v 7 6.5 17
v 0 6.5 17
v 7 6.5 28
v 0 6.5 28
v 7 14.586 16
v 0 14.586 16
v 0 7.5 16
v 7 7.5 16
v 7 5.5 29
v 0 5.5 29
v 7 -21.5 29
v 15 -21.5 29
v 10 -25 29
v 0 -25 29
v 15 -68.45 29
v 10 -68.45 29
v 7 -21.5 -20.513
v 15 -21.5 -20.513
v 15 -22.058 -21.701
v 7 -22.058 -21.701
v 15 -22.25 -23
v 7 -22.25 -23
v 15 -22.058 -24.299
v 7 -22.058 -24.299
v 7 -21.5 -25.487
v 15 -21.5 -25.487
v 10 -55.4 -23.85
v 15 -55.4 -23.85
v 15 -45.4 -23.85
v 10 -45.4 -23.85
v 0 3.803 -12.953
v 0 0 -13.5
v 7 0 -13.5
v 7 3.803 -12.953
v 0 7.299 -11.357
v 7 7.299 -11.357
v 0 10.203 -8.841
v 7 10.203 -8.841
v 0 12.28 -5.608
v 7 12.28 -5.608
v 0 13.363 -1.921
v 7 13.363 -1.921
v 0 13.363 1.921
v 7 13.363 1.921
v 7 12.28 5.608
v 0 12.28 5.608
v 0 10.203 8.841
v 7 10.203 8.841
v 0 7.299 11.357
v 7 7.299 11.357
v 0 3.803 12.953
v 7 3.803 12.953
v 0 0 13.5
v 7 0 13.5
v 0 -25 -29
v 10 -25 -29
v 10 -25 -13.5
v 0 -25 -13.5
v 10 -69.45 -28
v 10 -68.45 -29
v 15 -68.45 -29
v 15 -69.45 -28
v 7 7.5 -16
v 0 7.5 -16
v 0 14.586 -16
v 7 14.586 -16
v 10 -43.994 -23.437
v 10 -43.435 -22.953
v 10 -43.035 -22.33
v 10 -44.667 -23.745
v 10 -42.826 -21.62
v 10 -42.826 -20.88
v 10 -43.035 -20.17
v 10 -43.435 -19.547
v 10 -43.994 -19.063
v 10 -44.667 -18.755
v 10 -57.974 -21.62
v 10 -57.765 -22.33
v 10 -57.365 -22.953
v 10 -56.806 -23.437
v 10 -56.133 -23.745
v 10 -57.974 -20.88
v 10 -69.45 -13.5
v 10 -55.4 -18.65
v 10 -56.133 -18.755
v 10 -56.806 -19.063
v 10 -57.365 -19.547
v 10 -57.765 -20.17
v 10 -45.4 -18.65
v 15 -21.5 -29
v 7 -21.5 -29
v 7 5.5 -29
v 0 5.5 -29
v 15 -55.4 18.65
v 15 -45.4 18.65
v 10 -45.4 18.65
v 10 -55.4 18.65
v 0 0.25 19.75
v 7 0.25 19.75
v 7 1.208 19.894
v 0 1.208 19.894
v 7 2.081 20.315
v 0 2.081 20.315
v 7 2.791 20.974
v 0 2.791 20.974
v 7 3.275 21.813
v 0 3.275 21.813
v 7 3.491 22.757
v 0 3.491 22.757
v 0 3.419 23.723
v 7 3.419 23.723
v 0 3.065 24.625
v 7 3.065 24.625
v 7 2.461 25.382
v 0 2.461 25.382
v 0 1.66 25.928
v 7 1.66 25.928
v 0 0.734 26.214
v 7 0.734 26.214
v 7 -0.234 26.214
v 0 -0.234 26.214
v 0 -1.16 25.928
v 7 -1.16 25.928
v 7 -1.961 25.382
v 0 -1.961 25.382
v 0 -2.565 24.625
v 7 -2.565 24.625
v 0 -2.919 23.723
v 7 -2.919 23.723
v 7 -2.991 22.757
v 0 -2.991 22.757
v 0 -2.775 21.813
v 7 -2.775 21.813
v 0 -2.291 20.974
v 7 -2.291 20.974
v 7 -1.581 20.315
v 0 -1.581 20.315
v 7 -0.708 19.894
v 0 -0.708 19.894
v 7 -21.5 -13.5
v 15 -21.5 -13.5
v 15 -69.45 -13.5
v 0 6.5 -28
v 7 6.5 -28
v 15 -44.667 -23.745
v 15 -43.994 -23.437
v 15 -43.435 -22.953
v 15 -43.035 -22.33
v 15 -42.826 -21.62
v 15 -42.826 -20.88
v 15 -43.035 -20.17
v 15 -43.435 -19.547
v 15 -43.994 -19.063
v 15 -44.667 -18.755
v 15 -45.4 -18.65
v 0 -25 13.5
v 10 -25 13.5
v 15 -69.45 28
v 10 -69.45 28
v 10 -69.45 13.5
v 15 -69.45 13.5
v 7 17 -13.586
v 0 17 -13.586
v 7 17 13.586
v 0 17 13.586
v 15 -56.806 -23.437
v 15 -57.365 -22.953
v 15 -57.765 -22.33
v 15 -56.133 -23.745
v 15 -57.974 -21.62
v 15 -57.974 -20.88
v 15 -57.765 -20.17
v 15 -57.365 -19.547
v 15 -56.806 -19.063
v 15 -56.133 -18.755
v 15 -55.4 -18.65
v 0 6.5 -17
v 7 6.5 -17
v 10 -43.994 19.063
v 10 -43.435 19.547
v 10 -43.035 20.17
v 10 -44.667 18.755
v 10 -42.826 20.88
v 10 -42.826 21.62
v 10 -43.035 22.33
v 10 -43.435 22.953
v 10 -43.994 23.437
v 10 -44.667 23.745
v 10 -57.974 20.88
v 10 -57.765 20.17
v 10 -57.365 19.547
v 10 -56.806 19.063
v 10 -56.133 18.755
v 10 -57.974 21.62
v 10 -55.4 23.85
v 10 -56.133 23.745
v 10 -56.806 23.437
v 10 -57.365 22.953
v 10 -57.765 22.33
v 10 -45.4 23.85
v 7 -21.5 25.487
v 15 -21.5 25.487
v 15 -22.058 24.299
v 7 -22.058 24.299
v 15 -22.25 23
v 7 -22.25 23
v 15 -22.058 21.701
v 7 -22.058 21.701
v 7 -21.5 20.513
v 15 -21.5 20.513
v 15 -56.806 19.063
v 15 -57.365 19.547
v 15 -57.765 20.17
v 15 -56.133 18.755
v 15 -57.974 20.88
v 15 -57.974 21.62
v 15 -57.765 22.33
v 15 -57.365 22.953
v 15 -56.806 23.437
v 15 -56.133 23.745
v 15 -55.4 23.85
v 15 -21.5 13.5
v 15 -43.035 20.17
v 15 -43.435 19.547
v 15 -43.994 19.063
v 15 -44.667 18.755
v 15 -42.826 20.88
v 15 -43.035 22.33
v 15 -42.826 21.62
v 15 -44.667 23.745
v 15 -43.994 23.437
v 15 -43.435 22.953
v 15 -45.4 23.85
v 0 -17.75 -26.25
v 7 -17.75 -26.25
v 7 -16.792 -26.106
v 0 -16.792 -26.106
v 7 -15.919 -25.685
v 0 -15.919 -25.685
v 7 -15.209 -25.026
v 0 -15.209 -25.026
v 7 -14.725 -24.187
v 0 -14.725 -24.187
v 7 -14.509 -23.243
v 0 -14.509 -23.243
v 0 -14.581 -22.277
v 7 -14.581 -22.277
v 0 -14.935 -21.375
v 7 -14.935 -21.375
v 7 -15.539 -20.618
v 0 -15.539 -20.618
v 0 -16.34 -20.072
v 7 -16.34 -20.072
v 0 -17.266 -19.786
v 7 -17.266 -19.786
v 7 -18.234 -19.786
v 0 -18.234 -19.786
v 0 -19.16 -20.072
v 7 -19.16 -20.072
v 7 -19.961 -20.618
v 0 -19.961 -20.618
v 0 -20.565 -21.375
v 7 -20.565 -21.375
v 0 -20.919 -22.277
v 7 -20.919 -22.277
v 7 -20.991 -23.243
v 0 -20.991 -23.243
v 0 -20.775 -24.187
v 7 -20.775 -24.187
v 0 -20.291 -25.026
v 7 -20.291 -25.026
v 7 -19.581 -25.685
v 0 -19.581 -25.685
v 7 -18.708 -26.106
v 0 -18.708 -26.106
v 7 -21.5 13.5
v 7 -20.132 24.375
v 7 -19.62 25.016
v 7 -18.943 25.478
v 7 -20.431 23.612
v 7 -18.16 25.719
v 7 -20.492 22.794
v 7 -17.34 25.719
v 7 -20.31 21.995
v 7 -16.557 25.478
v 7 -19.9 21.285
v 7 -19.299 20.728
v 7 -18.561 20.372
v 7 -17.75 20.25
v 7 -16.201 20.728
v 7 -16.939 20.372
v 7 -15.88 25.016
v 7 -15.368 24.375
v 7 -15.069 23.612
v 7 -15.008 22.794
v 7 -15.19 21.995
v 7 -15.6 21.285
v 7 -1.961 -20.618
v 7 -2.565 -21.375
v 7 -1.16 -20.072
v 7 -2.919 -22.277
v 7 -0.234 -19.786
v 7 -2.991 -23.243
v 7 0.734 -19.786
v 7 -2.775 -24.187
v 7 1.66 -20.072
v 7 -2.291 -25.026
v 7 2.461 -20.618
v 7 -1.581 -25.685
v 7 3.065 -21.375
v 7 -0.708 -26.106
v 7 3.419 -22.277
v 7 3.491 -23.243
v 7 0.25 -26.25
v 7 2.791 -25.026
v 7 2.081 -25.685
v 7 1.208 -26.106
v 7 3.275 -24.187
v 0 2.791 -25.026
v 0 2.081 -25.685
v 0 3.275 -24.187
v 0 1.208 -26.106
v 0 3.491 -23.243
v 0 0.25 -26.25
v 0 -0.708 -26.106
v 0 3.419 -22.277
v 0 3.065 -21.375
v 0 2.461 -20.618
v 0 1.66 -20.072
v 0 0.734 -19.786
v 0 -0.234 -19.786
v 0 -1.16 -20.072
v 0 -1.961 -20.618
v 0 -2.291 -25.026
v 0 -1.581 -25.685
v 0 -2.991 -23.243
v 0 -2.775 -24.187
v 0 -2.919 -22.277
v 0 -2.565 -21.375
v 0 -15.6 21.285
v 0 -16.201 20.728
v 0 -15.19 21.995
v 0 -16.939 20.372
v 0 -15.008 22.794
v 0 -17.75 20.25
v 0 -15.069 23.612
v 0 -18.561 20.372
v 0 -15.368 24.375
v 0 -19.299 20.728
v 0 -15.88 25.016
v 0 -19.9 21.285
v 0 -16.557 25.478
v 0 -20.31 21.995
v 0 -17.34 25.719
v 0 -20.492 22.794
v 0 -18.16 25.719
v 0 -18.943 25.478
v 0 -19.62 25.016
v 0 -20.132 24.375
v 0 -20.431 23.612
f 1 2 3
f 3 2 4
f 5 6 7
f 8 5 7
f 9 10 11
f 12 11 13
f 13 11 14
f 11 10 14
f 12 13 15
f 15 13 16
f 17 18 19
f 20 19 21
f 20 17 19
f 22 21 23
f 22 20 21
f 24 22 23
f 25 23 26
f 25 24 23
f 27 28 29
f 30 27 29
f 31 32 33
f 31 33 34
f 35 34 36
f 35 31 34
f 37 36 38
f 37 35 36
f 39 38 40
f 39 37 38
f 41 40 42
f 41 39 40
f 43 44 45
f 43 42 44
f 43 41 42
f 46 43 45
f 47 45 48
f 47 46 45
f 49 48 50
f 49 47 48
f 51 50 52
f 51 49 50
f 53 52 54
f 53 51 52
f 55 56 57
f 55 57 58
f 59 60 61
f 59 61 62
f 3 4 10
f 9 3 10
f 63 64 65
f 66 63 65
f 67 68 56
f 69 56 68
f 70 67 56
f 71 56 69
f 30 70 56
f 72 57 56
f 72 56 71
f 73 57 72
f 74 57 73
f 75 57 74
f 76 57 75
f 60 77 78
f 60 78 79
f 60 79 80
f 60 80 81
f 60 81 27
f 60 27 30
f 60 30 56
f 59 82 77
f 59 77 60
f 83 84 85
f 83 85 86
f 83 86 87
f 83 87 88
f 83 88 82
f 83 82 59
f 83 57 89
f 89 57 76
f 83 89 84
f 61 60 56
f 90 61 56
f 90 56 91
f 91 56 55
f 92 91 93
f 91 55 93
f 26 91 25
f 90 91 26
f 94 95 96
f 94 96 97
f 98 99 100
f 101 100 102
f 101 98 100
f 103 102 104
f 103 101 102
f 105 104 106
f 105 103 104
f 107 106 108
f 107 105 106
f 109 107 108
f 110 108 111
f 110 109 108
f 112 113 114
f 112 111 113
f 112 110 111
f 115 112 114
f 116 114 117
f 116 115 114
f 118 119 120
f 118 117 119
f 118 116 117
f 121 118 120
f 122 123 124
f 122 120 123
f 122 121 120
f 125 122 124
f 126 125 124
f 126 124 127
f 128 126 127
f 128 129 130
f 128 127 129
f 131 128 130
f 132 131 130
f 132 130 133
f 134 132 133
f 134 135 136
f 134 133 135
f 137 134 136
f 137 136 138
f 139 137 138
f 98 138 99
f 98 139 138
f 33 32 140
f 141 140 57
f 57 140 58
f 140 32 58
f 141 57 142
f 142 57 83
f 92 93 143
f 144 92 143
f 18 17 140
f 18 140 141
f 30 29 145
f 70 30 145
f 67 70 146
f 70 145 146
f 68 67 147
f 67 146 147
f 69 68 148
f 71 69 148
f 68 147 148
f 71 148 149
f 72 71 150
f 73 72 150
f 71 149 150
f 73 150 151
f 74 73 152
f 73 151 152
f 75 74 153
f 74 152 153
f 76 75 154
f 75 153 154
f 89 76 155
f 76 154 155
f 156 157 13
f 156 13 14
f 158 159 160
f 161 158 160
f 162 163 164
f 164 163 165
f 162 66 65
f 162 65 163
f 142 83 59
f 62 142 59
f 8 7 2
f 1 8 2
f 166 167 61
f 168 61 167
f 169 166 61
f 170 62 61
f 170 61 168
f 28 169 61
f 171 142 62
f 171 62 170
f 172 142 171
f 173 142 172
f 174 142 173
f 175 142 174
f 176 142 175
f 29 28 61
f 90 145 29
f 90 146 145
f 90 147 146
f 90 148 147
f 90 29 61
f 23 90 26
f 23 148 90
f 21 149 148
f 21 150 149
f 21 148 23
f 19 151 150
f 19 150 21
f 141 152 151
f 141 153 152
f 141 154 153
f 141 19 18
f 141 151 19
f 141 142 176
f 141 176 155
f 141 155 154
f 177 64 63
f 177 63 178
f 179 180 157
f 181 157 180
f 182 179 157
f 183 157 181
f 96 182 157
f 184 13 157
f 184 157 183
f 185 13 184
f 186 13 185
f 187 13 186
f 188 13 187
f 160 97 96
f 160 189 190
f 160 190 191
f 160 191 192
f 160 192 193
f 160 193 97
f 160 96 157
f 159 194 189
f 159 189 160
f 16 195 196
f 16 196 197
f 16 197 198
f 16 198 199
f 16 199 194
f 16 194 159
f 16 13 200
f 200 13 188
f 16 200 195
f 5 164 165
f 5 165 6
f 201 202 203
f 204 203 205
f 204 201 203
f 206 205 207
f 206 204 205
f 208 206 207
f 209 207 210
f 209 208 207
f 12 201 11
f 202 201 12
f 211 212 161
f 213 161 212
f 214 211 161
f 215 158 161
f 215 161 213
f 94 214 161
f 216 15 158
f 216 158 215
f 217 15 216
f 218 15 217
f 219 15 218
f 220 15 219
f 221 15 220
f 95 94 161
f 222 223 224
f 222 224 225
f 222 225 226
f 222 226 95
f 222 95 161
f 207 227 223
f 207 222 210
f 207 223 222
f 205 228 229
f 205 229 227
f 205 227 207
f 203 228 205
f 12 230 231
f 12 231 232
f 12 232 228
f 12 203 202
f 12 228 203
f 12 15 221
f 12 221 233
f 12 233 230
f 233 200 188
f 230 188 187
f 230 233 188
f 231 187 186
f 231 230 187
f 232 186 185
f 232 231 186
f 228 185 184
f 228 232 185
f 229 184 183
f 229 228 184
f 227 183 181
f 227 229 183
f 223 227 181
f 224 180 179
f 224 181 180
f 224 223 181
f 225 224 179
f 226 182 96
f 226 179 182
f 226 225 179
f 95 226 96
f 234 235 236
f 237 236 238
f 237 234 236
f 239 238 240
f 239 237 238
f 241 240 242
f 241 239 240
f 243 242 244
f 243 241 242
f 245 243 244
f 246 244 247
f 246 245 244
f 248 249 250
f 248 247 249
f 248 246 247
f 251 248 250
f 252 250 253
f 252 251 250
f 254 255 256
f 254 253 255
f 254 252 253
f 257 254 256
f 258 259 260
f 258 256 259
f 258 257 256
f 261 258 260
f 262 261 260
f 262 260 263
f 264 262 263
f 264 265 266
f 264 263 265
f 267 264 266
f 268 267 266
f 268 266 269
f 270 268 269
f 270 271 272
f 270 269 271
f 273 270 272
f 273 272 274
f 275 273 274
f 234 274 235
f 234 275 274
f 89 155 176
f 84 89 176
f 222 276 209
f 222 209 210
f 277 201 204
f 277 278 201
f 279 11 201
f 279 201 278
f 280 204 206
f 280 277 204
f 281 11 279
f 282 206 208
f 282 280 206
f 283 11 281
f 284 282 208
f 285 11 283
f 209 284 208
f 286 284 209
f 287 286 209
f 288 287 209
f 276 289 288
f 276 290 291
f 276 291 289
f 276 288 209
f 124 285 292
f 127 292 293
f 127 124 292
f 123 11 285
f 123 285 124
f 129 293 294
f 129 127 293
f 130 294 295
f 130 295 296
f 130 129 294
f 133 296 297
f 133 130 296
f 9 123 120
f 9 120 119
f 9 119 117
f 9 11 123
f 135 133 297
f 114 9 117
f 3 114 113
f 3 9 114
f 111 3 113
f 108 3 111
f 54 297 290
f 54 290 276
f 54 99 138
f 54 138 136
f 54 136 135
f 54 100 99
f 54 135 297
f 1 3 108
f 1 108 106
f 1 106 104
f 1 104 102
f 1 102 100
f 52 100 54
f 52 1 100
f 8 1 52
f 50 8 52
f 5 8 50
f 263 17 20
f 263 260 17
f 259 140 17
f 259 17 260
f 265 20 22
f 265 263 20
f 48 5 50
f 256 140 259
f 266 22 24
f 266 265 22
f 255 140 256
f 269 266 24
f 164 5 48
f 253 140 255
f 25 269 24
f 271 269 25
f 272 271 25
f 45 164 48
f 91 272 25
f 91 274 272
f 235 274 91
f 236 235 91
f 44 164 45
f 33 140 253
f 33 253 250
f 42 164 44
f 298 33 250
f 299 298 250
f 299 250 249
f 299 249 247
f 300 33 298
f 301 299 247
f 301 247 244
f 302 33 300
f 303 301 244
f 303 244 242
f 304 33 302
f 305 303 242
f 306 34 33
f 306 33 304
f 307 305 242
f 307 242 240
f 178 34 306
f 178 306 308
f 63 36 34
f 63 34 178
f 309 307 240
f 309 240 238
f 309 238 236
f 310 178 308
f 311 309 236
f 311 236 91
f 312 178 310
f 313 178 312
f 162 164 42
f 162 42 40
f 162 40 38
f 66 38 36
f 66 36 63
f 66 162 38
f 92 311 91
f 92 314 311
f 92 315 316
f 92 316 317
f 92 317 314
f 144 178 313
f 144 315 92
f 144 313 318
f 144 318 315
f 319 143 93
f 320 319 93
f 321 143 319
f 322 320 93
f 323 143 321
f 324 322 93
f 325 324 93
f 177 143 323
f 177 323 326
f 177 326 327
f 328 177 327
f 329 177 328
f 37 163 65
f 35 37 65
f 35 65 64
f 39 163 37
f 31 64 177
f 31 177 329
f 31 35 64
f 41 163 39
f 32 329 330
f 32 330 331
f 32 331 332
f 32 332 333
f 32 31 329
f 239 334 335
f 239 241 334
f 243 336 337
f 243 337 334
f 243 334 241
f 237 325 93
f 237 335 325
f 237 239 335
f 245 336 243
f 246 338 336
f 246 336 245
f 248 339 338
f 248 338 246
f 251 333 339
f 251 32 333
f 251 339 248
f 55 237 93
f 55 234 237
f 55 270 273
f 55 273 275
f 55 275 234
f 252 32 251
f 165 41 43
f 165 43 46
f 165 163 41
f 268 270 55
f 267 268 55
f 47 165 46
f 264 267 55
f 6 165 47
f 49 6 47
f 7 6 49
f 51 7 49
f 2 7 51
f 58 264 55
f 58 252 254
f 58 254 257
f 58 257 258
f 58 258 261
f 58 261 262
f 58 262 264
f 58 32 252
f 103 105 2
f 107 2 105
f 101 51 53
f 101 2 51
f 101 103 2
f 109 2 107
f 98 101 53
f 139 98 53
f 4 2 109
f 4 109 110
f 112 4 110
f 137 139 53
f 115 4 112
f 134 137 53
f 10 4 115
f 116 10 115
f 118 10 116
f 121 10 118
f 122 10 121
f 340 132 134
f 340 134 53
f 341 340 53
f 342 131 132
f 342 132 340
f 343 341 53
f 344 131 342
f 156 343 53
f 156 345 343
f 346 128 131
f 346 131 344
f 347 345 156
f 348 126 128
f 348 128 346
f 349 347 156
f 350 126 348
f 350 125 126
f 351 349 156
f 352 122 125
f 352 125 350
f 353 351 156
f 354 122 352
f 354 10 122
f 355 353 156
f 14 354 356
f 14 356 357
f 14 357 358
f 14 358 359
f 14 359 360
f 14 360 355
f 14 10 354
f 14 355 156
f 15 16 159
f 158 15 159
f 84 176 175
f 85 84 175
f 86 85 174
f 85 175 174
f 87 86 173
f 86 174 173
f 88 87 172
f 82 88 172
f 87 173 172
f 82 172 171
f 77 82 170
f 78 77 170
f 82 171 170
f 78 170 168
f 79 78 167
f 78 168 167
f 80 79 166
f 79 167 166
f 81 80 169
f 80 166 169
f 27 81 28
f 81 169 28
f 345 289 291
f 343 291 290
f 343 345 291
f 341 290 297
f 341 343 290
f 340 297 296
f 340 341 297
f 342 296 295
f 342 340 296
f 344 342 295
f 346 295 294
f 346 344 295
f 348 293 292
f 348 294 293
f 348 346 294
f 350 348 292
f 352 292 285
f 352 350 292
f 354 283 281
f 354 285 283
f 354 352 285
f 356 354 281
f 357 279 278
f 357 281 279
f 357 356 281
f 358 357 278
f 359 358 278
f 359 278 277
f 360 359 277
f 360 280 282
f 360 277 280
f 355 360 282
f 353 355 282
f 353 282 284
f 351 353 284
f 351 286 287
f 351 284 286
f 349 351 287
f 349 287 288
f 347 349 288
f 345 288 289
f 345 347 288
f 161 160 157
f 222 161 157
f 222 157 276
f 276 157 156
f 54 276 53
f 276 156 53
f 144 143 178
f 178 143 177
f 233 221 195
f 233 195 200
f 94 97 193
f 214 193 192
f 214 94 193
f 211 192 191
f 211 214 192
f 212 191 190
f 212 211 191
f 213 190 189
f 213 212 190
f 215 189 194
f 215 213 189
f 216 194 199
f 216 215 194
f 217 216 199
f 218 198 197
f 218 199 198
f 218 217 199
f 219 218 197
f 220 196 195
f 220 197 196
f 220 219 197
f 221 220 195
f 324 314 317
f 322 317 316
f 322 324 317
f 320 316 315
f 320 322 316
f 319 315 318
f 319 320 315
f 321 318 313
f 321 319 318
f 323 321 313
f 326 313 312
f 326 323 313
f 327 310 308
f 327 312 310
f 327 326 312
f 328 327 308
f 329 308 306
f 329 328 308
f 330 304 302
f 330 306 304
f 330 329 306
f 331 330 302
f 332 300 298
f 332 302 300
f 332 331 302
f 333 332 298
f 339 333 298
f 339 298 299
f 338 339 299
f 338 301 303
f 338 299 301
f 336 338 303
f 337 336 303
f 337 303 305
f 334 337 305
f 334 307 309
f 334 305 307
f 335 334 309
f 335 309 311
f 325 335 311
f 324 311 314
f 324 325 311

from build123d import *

# Parameters (mm, degrees)
SKETCH1_W                               = 43
SKETCH1_H                               = 60
BOSS_EXTRUDE1_DEPTH                     = 20
SKETCH2_W                               = 13
SKETCH2_H                               = 10.5
CUT_EXTRUDE1_DEPTH                      = 44.874821937
SKETCH3_W                               = 13
SKETCH3_H                               = 10.5
CUT_EXTRUDE2_DEPTH                      = 44.874821937
F_5_5_5_5_DIAMETER_HOLE1_D              = 5.5
M22_CLEARANCE_HOLE1_D                   = 26
F_5_5_5_5_DIAMETER_HOLE2_D              = 5.5
F_5_5_5_5_DIAMETER_HOLE2_DEPTH          = 30
CBORE_FOR_M5_HEX_HEAD_BOLT1_D           = 5.5
CBORE_FOR_M5_HEX_HEAD_BOLT1_DEPTH       = 39.75
CBORE_FOR_M5_HEX_HEAD_BOLT1_CBORE_D     = 10.8
CBORE_FOR_M5_HEX_HEAD_BOLT1_CBORE_DEPTH = 3
CHAMFER1_SIZE                           = 3
CHAMFER2_SIZE                           = 0.5
CHAMFER3_SIZE                           = 1
BOSS_EXTRUDE2_OUTLINE_R                 = 2.75
BOSS_EXTRUDE2_OUTLINE_R_2               = 3.25
BOSS_EXTRUDE2_OUTLINE_R_3               = 13.5
BOSS_EXTRUDE2_DEPTH                     = 15
CUT_EXTRUDE4_DEPTH                      = 15
CHAMFER4_SIZE                           = 1
CUT_EXTRUDE5_DEPTH                      = 94.296851501
CUT_EXTRUDE5_DEPTH_BACK                 = 94.296851501
SKETCH17_W                              = 10
SKETCH17_H                              = 43.45
SKETCH17_H_2                            = 1
CUT_EXTRUDE6_DEPTH                      = 77.741791092
SKETCH20_R                              = 13.5
SKETCH20_W                              = 27
SKETCH20_H                              = 44.45
CUT_EXTRUDE7_DEPTH                      = 77.741791092
SKETCH22_W                              = 8
SKETCH22_H                              = 58
CUT_EXTRUDE8_DEPTH                      = 38.5
SKETCH23_R                              = 4.5
CUT_EXTRUDE9_DEPTH                      = 76.68555014


# Read off the part's stored shape, not the designer's step: Boss-Extrude2
with BuildPart() as part:
    # Sketch1 → Boss-Extrude1 (new body)
    with BuildSketch(Plane(origin=(-20, 0, 0), x_dir=(0, -1, 0), z_dir=(-1, 0, 0))):
        with Locations((3.5, 0)):
            Rectangle(SKETCH1_W, SKETCH1_H)
    extrude(amount=-BOSS_EXTRUDE1_DEPTH)

    # Sketch2 → Cut-Extrude1 (cut, through all)
    with BuildSketch(Plane(origin=(0, 0, 0), x_dir=(0, 0, -1), z_dir=(1, 0, 0))):
        with Locations((-23.5, 12.75)):
            Rectangle(SKETCH2_W, SKETCH2_H)
    extrude(amount=-CUT_EXTRUDE1_DEPTH, mode=Mode.SUBTRACT)

    # Sketch3 → Cut-Extrude2 (cut, through all)
    with BuildSketch(Plane(origin=(0, 0, 0), x_dir=(0, 0, -1), z_dir=(1, 0, 0))):
        with Locations((23.5, 12.75)):
            Rectangle(SKETCH3_W, SKETCH3_H)
    extrude(amount=-CUT_EXTRUDE2_DEPTH, mode=Mode.SUBTRACT)

    # Ø5.5 (5.5) Diameter Hole1 (through all)
    with Locations(Plane.ZY.offset(20)):
        with Locations((23, 0.25), (-23, -17.75), (-23, 0.25)):
            Hole(F_5_5_5_5_DIAMETER_HOLE1_D / 2)

    # M22 Clearance Hole1 (through all)
    with Locations(Plane(origin=(0, 0, 0), x_dir=(0, 0, -1), z_dir=(1, 0, 0))):
        with Locations((0, 0)):
            Hole(M22_CLEARANCE_HOLE1_D / 2)

    # Ø5.5 (5.5) Diameter Hole2
    with Locations(Plane(origin=(0, 0, 0), x_dir=(0, 0, -1), z_dir=(1, 0, 0))):
        with Locations((-23, -17.75)):
            Hole(F_5_5_5_5_DIAMETER_HOLE2_D / 2, depth=F_5_5_5_5_DIAMETER_HOLE2_DEPTH)

    # CBORE for M5 Hex Head Bolt1
    with Locations(Plane(origin=(0, 7.5, 0), x_dir=(1, 0, 0), z_dir=(0, 1, 0))):
        with Locations((-10, 23), (-10, -23)):
            CounterBoreHole(CBORE_FOR_M5_HEX_HEAD_BOLT1_D / 2, CBORE_FOR_M5_HEX_HEAD_BOLT1_CBORE_D / 2, CBORE_FOR_M5_HEX_HEAD_BOLT1_CBORE_DEPTH, depth=CBORE_FOR_M5_HEX_HEAD_BOLT1_DEPTH)

    # Chamfer1
    chamfer1_edges = [part.edges().sort_by_distance(p)[0] for p in [
        (-10, 18, 17),
        (-10, 18, -17),
    ]]
    chamfer(chamfer1_edges, length=CHAMFER1_SIZE)

    # Chamfer2
    chamfer2_edges = [part.edges().sort_by_distance(p)[0] for p in [
        (-7.25, -25, -23),
        (-20, 0.25, -20.25),
        (0, 0.25, -20.25),
        (-20, -17.75, -20.25),
        (0, -17.75, -20.25),
        (-20, 0.25, 25.75),
        (0, 0.25, 25.75),
        (0, 0, -13),
        (-20, 0, -13),
        (-20, -17.75, 20.25),
        (0, -17.75, 20.25),
        (-7.25, -25, 23),
    ]]
    chamfer(chamfer2_edges, length=CHAMFER2_SIZE)

    # Chamfer3
    chamfer3_edges = [part.edges().sort_by_distance(p)[0] for p in [
        (0, 11.25, -17),
        (-20, 11.25, -17),
        (0, 18, 0),
        (0, 16.5, 15.5),
        (0, 16.5, -15.5),
        (-20, 18, 0),
        (-20, 16.5, 15.5),
        (-20, 16.5, -15.5),
        (-10, 7.5, 30),
        (-20, 11.25, 17),
        (-20, 7.5, 23.5),
        (0, 7.5, 23.5),
        (0, 11.25, 17),
        (-20, -8.75, -30),
        (0, -8.75, -30),
        (-20, 7.5, -23.5),
        (-10, 7.5, -30),
        (0, 7.5, -23.5),
        (0, -25, 0),
        (-20, -8.75, 30),
        (-20, -25, 0),
        (-10, -25, -30),
        (-10, -25, 30),
        (0, -8.75, 30),
    ]]
    chamfer(chamfer3_edges, length=CHAMFER3_SIZE)

    # Boss-Extrude2 outline → Boss-Extrude2 (add)
    with BuildSketch(Plane(origin=(0, 0, 0), x_dir=(0, 0, -1), z_dir=(1, 0, 0))):
        Polygon((-29, 6.5), (-29, -69.45), (29, -69.45), (29, 6.5), (16, 6.5), (16, 14.585786438), (13.585786438, 17), (-13.585786438, 17), (-16, 14.585786438), (-16, 6.5), align=None)
        with Locations((-23, -17.75)):
            Circle(BOSS_EXTRUDE2_OUTLINE_R, mode=Mode.SUBTRACT)
        with Locations((-23, 0.25)):
            Circle(BOSS_EXTRUDE2_OUTLINE_R_2, mode=Mode.SUBTRACT)
        with Locations((23, -17.75)):
            Circle(BOSS_EXTRUDE2_OUTLINE_R_2, mode=Mode.SUBTRACT)
        Circle(BOSS_EXTRUDE2_OUTLINE_R_3, mode=Mode.SUBTRACT)
        with Locations((23, 0.25)):
            Circle(BOSS_EXTRUDE2_OUTLINE_R_2, mode=Mode.SUBTRACT)
    extrude(amount=BOSS_EXTRUDE2_DEPTH)

    # Sketch16 → Cut-Extrude4 (cut)
    with BuildSketch(Plane(origin=(15, 0, 0), x_dir=(0, 0, -1), z_dir=(1, 0, 0))):
        with BuildLine():
            Line((-23.85, -55.4), (-23.85, -45.4))
            ThreePointArc((-23.85, -45.4), (-21.25, -42.8), (-18.65, -45.4))
            Line((-18.65, -45.4), (-18.65, -55.4))
            ThreePointArc((-18.65, -55.4), (-21.25, -58), (-23.85, -55.4))
        make_face()
        with BuildLine():
            Line((23.85, -55.4), (23.85, -45.4))
            ThreePointArc((23.85, -45.4), (21.25, -42.8), (18.65, -45.4))
            Line((18.65, -45.4), (18.65, -55.4))
            ThreePointArc((18.65, -55.4), (21.25, -58), (23.85, -55.4))
        make_face()
    extrude(amount=-CUT_EXTRUDE4_DEPTH, mode=Mode.SUBTRACT)

    # Chamfer4
    # the kernel refuses this chamfer: 1 mm, written as the material it adds along each edge
    with BuildSketch(Plane(origin=(-2.571682988, 6.5, -16), x_dir=(0, 0.9996219169112968, 0.027495876610585623), z_dir=(1, 0, 0))) as chamfer4_piece_1:
        Polygon((CHAMFER4_SIZE * 0.999621916911, -CHAMFER4_SIZE * 0.0274958766106), (-CHAMFER4_SIZE * 0.0274958766106, -CHAMFER4_SIZE * 0.999621916911), (0, 0), align=None)
    extrude(amount=17.571682988)
    with BuildSketch(Plane(origin=(-2.571682988, 6.5, 16), x_dir=(0, 0.9996219169112968, -0.027495876610585623), z_dir=(1, 0, 0))) as chamfer4_piece_2:
        Polygon((CHAMFER4_SIZE * 0.999621916911, CHAMFER4_SIZE * 0.0274958766106), (-CHAMFER4_SIZE * 0.0274958766106, CHAMFER4_SIZE * 0.999621916911), (0, 0), align=None)
    extrude(amount=17.571682988)
    # the kernel refuses this chamfer: 1 mm, written as the material it takes off along each edge
    with BuildSketch(Plane(origin=(-2.571682988, 6.5, 29), x_dir=(0, -0.9996219169112968, 0.027495876610585623), z_dir=(1, 0, 0))) as chamfer4_2_piece_1_section:
        Polygon((CHAMFER4_SIZE * 0.999621916911, CHAMFER4_SIZE * 0.0274958766106), (-CHAMFER4_SIZE * 0.0274958766106, CHAMFER4_SIZE * 0.999621916911), (0, 0), align=None)
    chamfer4_2_piece_1 = extrude(amount=20.143365976, mode=Mode.PRIVATE)
    chamfer4_2_piece_1 = split(chamfer4_2_piece_1, bisect_by=Plane(origin=(0.509665213, 6.397220748, 28.490334787), z_dir=(-0.7071067811865551, 0, -0.7071067811865401)), keep=Keep.TOP, mode=Mode.PRIVATE)
    chamfer4_2_piece_1 = split(chamfer4_2_piece_1, bisect_by=Plane(origin=(0.238407906, 6.261592094, 28.354706133), z_dir=(0.7071067811865476, 0.7071067811865475, -8.40952718991379e-15)), keep=Keep.TOP, mode=Mode.PRIVATE)
    add(chamfer4_2_piece_1, mode=Mode.SUBTRACT)
    with BuildSketch(Plane(origin=(-2.571682988, 6.5, 29), x_dir=(0, -0.9996219169112968, 0.027495876610585623), z_dir=(1, 0, 0))) as chamfer4_2_piece_2_section:
        Polygon((CHAMFER4_SIZE * 0.999621916911, CHAMFER4_SIZE * 0.0274958766106), (-CHAMFER4_SIZE * 0.0274958766106, CHAMFER4_SIZE * 0.999621916911), (0, 0), align=None)
    chamfer4_2_piece_2 = extrude(amount=20.143365976, mode=Mode.PRIVATE)
    chamfer4_2_piece_2 = split(chamfer4_2_piece_2, bisect_by=Plane(origin=(0.238407906, 5.854706133, 28.761592094), z_dir=(0.7071067811865551, 0, 0.7071067811865401)), keep=Keep.TOP, mode=Mode.PRIVATE)
    chamfer4_2_piece_2 = split(chamfer4_2_piece_2, bisect_by=Plane(origin=(0.509665213, 5.990334787, 28.897220748), z_dir=(-0.7071067811865476, -0.7071067811865475, 8.40952718991379e-15)), keep=Keep.TOP, mode=Mode.PRIVATE)
    add(chamfer4_2_piece_2, mode=Mode.SUBTRACT)
    with BuildSketch(Plane(origin=(-2.571682988, 6.5, 29), x_dir=(0, -0.9996219169112968, 0.027495876610585623), z_dir=(1, 0, 0))) as chamfer4_2_piece_3_section:
        Polygon((CHAMFER4_SIZE * 0.999621916911, CHAMFER4_SIZE * 0.0274958766106), (-CHAMFER4_SIZE * 0.0274958766106, CHAMFER4_SIZE * 0.999621916911), (0, 0), align=None)
    chamfer4_2_piece_3 = extrude(amount=20.143365976, mode=Mode.PRIVATE)
    chamfer4_2_piece_3 = split(chamfer4_2_piece_3, bisect_by=Plane(origin=(4.683816691, 6.171538214, 24.316183309), z_dir=(0.7071067811865551, 0, 0.7071067811865401)), keep=Keep.TOP, mode=Mode.PRIVATE)
    chamfer4_2_piece_3 = split(chamfer4_2_piece_3, bisect_by=Plane(origin=(4.683816691, 1.816183309, 28.671538214), z_dir=(0.7071067811865476, 0.7071067811865475, -8.40952718991379e-15)), keep=Keep.TOP, mode=Mode.PRIVATE)
    add(chamfer4_2_piece_3, mode=Mode.SUBTRACT)
    with BuildSketch(Plane(origin=(-2.571682988, -69.45, 29), x_dir=(0, 0.9996219169112968, 0.02749587661058574), z_dir=(1, 0, 0))) as chamfer4_2_piece_4:
        Polygon((CHAMFER4_SIZE * 0.999621916911, -CHAMFER4_SIZE * 0.0274958766106), (-CHAMFER4_SIZE * 0.0274958766106, -CHAMFER4_SIZE * 0.999621916911), (0, 0), align=None)
    extrude(amount=20.143365976, mode=Mode.SUBTRACT)
    with BuildSketch(Plane(origin=(-2.571682988, -69.45, -29), x_dir=(0, 0.9996219169112968, -0.02749587661058574), z_dir=(1, 0, 0))) as chamfer4_2_piece_5:
        Polygon((CHAMFER4_SIZE * 0.999621916911, CHAMFER4_SIZE * 0.0274958766106), (-CHAMFER4_SIZE * 0.0274958766106, CHAMFER4_SIZE * 0.999621916911), (0, 0), align=None)
    extrude(amount=20.143365976, mode=Mode.SUBTRACT)
    with BuildSketch(Plane(origin=(-2.571682988, 6.5, -29), x_dir=(1.2022868737477314e-14, 0.02749587661058651, 0.9996219169112968), z_dir=(1, 0, 0))) as chamfer4_2_piece_6_section:
        Polygon((CHAMFER4_SIZE * 0.999621916911, CHAMFER4_SIZE * 0.0274958766106), (-CHAMFER4_SIZE * 0.0274958766106, CHAMFER4_SIZE * 0.999621916911), (0, 0), align=None)
    chamfer4_2_piece_6 = extrude(amount=20.143365976, mode=Mode.PRIVATE)
    chamfer4_2_piece_6 = split(chamfer4_2_piece_6, bisect_by=Plane(origin=(0.509665213, 5.990334787, -28.897220748), z_dir=(-0.7071067811865476, -0.7071067811865475, 8.60574949101178e-15)), keep=Keep.TOP, mode=Mode.PRIVATE)
    chamfer4_2_piece_6 = split(chamfer4_2_piece_6, bisect_by=Plane(origin=(0.238407906, 5.854706133, -28.761592094), z_dir=(0.707106781186539, 0, -0.7071067811865561)), keep=Keep.TOP, mode=Mode.PRIVATE)
    add(chamfer4_2_piece_6, mode=Mode.SUBTRACT)
    with BuildSketch(Plane(origin=(-2.571682988, 6.5, -29), x_dir=(1.2022868737477314e-14, 0.02749587661058651, 0.9996219169112968), z_dir=(1, 0, 0))) as chamfer4_2_piece_7_section:
        Polygon((CHAMFER4_SIZE * 0.999621916911, CHAMFER4_SIZE * 0.0274958766106), (-CHAMFER4_SIZE * 0.0274958766106, CHAMFER4_SIZE * 0.999621916911), (0, 0), align=None)
    chamfer4_2_piece_7 = extrude(amount=20.143365976, mode=Mode.PRIVATE)
    chamfer4_2_piece_7 = split(chamfer4_2_piece_7, bisect_by=Plane(origin=(0.238407906, 6.261592094, -28.354706133), z_dir=(0.7071067811865476, 0.7071067811865475, -8.60574949101178e-15)), keep=Keep.TOP, mode=Mode.PRIVATE)
    chamfer4_2_piece_7 = split(chamfer4_2_piece_7, bisect_by=Plane(origin=(0.509665213, 6.397220748, -28.490334787), z_dir=(-0.707106781186539, 0, 0.7071067811865561)), keep=Keep.TOP, mode=Mode.PRIVATE)
    add(chamfer4_2_piece_7, mode=Mode.SUBTRACT)
    with BuildSketch(Plane(origin=(-2.571682988, 6.5, -29), x_dir=(1.2022868737477314e-14, 0.02749587661058651, 0.9996219169112968), z_dir=(1, 0, 0))) as chamfer4_2_piece_8_section:
        Polygon((CHAMFER4_SIZE * 0.999621916911, CHAMFER4_SIZE * 0.0274958766106), (-CHAMFER4_SIZE * 0.0274958766106, CHAMFER4_SIZE * 0.999621916911), (0, 0), align=None)
    chamfer4_2_piece_8 = extrude(amount=20.143365976, mode=Mode.PRIVATE)
    chamfer4_2_piece_8 = split(chamfer4_2_piece_8, bisect_by=Plane(origin=(4.683816691, 1.816183309, -28.671538214), z_dir=(0.7071067811865476, 0.7071067811865475, -8.60574949101178e-15)), keep=Keep.TOP, mode=Mode.PRIVATE)
    chamfer4_2_piece_8 = split(chamfer4_2_piece_8, bisect_by=Plane(origin=(4.683816691, 6.171538214, -24.316183309), z_dir=(0.707106781186539, 0, -0.7071067811865561)), keep=Keep.TOP, mode=Mode.PRIVATE)
    add(chamfer4_2_piece_8, mode=Mode.SUBTRACT)

    # Sketch17 → Cut-Extrude5 (cut, two sides: drawn at the far end of the back side and taken through both)
    with BuildSketch(Plane(origin=(0, 0, -29), x_dir=(-1, 0, 0), z_dir=(0, 0, -1)).offset(-CUT_EXTRUDE5_DEPTH_BACK)):
        Polygon((20, -25), (20, 18), (0, 18), (0, 5.5), (0, -24), (0, -25), align=None)
        with Locations((-5, -46.725)):
            Rectangle(SKETCH17_W, SKETCH17_H)
        with Locations((-5, -68.95)):
            Rectangle(SKETCH17_W, SKETCH17_H_2)
    extrude(amount=CUT_EXTRUDE5_DEPTH + CUT_EXTRUDE5_DEPTH_BACK, mode=Mode.SUBTRACT)

    # Sketch18 → Cut-Extrude6 (cut, through all)
    with BuildSketch(Plane(origin=(15, 0, 0), x_dir=(0, 0, -1), z_dir=(1, 0, 0))):
        Polygon((-29, 5.5), (-29, 6.5), (-28, 6.5), align=None)
        Polygon((28, 6.5), (29, 6.5), (29, 5.5), align=None)
    extrude(amount=-CUT_EXTRUDE6_DEPTH, mode=Mode.SUBTRACT)

    # Sketch20 → Cut-Extrude7 (cut, through all)
    with BuildSketch(Plane.ZY):
        Circle(SKETCH20_R)
        with BuildLine():
            ThreePointArc((13.5, 0), (0, -13.5), (-13.5, 0))
            Line((-13.5, 0), (-13.5, -25))
            Line((-13.5, -25), (13.5, -25))
            Line((13.5, -25), (13.5, 0))
        make_face()
        with Locations((0, -47.225)):
            Rectangle(SKETCH20_W, SKETCH20_H)
    extrude(amount=-CUT_EXTRUDE7_DEPTH, mode=Mode.SUBTRACT)

    # Sketch22 → Cut-Extrude8 (cut)
    with BuildSketch(Plane(origin=(0, 17, 0), x_dir=(1, 0, 0), z_dir=(0, 1, 0))):
        with Locations((11, 0)):
            Rectangle(SKETCH22_W, SKETCH22_H)
    extrude(amount=-CUT_EXTRUDE8_DEPTH, mode=Mode.SUBTRACT)

    # Sketch23 → Cut-Extrude9 (cut, through all)
    with BuildSketch(Plane(origin=(7, 0, 0), x_dir=(0, 0, -1), z_dir=(1, 0, 0))):
        with Locations((-23, -17.75)):
            Circle(SKETCH23_R)
        with Locations((23, -17.75)):
            Circle(SKETCH23_R)
    extrude(amount=CUT_EXTRUDE9_DEPTH, mode=Mode.SUBTRACT)


solid = part.part
